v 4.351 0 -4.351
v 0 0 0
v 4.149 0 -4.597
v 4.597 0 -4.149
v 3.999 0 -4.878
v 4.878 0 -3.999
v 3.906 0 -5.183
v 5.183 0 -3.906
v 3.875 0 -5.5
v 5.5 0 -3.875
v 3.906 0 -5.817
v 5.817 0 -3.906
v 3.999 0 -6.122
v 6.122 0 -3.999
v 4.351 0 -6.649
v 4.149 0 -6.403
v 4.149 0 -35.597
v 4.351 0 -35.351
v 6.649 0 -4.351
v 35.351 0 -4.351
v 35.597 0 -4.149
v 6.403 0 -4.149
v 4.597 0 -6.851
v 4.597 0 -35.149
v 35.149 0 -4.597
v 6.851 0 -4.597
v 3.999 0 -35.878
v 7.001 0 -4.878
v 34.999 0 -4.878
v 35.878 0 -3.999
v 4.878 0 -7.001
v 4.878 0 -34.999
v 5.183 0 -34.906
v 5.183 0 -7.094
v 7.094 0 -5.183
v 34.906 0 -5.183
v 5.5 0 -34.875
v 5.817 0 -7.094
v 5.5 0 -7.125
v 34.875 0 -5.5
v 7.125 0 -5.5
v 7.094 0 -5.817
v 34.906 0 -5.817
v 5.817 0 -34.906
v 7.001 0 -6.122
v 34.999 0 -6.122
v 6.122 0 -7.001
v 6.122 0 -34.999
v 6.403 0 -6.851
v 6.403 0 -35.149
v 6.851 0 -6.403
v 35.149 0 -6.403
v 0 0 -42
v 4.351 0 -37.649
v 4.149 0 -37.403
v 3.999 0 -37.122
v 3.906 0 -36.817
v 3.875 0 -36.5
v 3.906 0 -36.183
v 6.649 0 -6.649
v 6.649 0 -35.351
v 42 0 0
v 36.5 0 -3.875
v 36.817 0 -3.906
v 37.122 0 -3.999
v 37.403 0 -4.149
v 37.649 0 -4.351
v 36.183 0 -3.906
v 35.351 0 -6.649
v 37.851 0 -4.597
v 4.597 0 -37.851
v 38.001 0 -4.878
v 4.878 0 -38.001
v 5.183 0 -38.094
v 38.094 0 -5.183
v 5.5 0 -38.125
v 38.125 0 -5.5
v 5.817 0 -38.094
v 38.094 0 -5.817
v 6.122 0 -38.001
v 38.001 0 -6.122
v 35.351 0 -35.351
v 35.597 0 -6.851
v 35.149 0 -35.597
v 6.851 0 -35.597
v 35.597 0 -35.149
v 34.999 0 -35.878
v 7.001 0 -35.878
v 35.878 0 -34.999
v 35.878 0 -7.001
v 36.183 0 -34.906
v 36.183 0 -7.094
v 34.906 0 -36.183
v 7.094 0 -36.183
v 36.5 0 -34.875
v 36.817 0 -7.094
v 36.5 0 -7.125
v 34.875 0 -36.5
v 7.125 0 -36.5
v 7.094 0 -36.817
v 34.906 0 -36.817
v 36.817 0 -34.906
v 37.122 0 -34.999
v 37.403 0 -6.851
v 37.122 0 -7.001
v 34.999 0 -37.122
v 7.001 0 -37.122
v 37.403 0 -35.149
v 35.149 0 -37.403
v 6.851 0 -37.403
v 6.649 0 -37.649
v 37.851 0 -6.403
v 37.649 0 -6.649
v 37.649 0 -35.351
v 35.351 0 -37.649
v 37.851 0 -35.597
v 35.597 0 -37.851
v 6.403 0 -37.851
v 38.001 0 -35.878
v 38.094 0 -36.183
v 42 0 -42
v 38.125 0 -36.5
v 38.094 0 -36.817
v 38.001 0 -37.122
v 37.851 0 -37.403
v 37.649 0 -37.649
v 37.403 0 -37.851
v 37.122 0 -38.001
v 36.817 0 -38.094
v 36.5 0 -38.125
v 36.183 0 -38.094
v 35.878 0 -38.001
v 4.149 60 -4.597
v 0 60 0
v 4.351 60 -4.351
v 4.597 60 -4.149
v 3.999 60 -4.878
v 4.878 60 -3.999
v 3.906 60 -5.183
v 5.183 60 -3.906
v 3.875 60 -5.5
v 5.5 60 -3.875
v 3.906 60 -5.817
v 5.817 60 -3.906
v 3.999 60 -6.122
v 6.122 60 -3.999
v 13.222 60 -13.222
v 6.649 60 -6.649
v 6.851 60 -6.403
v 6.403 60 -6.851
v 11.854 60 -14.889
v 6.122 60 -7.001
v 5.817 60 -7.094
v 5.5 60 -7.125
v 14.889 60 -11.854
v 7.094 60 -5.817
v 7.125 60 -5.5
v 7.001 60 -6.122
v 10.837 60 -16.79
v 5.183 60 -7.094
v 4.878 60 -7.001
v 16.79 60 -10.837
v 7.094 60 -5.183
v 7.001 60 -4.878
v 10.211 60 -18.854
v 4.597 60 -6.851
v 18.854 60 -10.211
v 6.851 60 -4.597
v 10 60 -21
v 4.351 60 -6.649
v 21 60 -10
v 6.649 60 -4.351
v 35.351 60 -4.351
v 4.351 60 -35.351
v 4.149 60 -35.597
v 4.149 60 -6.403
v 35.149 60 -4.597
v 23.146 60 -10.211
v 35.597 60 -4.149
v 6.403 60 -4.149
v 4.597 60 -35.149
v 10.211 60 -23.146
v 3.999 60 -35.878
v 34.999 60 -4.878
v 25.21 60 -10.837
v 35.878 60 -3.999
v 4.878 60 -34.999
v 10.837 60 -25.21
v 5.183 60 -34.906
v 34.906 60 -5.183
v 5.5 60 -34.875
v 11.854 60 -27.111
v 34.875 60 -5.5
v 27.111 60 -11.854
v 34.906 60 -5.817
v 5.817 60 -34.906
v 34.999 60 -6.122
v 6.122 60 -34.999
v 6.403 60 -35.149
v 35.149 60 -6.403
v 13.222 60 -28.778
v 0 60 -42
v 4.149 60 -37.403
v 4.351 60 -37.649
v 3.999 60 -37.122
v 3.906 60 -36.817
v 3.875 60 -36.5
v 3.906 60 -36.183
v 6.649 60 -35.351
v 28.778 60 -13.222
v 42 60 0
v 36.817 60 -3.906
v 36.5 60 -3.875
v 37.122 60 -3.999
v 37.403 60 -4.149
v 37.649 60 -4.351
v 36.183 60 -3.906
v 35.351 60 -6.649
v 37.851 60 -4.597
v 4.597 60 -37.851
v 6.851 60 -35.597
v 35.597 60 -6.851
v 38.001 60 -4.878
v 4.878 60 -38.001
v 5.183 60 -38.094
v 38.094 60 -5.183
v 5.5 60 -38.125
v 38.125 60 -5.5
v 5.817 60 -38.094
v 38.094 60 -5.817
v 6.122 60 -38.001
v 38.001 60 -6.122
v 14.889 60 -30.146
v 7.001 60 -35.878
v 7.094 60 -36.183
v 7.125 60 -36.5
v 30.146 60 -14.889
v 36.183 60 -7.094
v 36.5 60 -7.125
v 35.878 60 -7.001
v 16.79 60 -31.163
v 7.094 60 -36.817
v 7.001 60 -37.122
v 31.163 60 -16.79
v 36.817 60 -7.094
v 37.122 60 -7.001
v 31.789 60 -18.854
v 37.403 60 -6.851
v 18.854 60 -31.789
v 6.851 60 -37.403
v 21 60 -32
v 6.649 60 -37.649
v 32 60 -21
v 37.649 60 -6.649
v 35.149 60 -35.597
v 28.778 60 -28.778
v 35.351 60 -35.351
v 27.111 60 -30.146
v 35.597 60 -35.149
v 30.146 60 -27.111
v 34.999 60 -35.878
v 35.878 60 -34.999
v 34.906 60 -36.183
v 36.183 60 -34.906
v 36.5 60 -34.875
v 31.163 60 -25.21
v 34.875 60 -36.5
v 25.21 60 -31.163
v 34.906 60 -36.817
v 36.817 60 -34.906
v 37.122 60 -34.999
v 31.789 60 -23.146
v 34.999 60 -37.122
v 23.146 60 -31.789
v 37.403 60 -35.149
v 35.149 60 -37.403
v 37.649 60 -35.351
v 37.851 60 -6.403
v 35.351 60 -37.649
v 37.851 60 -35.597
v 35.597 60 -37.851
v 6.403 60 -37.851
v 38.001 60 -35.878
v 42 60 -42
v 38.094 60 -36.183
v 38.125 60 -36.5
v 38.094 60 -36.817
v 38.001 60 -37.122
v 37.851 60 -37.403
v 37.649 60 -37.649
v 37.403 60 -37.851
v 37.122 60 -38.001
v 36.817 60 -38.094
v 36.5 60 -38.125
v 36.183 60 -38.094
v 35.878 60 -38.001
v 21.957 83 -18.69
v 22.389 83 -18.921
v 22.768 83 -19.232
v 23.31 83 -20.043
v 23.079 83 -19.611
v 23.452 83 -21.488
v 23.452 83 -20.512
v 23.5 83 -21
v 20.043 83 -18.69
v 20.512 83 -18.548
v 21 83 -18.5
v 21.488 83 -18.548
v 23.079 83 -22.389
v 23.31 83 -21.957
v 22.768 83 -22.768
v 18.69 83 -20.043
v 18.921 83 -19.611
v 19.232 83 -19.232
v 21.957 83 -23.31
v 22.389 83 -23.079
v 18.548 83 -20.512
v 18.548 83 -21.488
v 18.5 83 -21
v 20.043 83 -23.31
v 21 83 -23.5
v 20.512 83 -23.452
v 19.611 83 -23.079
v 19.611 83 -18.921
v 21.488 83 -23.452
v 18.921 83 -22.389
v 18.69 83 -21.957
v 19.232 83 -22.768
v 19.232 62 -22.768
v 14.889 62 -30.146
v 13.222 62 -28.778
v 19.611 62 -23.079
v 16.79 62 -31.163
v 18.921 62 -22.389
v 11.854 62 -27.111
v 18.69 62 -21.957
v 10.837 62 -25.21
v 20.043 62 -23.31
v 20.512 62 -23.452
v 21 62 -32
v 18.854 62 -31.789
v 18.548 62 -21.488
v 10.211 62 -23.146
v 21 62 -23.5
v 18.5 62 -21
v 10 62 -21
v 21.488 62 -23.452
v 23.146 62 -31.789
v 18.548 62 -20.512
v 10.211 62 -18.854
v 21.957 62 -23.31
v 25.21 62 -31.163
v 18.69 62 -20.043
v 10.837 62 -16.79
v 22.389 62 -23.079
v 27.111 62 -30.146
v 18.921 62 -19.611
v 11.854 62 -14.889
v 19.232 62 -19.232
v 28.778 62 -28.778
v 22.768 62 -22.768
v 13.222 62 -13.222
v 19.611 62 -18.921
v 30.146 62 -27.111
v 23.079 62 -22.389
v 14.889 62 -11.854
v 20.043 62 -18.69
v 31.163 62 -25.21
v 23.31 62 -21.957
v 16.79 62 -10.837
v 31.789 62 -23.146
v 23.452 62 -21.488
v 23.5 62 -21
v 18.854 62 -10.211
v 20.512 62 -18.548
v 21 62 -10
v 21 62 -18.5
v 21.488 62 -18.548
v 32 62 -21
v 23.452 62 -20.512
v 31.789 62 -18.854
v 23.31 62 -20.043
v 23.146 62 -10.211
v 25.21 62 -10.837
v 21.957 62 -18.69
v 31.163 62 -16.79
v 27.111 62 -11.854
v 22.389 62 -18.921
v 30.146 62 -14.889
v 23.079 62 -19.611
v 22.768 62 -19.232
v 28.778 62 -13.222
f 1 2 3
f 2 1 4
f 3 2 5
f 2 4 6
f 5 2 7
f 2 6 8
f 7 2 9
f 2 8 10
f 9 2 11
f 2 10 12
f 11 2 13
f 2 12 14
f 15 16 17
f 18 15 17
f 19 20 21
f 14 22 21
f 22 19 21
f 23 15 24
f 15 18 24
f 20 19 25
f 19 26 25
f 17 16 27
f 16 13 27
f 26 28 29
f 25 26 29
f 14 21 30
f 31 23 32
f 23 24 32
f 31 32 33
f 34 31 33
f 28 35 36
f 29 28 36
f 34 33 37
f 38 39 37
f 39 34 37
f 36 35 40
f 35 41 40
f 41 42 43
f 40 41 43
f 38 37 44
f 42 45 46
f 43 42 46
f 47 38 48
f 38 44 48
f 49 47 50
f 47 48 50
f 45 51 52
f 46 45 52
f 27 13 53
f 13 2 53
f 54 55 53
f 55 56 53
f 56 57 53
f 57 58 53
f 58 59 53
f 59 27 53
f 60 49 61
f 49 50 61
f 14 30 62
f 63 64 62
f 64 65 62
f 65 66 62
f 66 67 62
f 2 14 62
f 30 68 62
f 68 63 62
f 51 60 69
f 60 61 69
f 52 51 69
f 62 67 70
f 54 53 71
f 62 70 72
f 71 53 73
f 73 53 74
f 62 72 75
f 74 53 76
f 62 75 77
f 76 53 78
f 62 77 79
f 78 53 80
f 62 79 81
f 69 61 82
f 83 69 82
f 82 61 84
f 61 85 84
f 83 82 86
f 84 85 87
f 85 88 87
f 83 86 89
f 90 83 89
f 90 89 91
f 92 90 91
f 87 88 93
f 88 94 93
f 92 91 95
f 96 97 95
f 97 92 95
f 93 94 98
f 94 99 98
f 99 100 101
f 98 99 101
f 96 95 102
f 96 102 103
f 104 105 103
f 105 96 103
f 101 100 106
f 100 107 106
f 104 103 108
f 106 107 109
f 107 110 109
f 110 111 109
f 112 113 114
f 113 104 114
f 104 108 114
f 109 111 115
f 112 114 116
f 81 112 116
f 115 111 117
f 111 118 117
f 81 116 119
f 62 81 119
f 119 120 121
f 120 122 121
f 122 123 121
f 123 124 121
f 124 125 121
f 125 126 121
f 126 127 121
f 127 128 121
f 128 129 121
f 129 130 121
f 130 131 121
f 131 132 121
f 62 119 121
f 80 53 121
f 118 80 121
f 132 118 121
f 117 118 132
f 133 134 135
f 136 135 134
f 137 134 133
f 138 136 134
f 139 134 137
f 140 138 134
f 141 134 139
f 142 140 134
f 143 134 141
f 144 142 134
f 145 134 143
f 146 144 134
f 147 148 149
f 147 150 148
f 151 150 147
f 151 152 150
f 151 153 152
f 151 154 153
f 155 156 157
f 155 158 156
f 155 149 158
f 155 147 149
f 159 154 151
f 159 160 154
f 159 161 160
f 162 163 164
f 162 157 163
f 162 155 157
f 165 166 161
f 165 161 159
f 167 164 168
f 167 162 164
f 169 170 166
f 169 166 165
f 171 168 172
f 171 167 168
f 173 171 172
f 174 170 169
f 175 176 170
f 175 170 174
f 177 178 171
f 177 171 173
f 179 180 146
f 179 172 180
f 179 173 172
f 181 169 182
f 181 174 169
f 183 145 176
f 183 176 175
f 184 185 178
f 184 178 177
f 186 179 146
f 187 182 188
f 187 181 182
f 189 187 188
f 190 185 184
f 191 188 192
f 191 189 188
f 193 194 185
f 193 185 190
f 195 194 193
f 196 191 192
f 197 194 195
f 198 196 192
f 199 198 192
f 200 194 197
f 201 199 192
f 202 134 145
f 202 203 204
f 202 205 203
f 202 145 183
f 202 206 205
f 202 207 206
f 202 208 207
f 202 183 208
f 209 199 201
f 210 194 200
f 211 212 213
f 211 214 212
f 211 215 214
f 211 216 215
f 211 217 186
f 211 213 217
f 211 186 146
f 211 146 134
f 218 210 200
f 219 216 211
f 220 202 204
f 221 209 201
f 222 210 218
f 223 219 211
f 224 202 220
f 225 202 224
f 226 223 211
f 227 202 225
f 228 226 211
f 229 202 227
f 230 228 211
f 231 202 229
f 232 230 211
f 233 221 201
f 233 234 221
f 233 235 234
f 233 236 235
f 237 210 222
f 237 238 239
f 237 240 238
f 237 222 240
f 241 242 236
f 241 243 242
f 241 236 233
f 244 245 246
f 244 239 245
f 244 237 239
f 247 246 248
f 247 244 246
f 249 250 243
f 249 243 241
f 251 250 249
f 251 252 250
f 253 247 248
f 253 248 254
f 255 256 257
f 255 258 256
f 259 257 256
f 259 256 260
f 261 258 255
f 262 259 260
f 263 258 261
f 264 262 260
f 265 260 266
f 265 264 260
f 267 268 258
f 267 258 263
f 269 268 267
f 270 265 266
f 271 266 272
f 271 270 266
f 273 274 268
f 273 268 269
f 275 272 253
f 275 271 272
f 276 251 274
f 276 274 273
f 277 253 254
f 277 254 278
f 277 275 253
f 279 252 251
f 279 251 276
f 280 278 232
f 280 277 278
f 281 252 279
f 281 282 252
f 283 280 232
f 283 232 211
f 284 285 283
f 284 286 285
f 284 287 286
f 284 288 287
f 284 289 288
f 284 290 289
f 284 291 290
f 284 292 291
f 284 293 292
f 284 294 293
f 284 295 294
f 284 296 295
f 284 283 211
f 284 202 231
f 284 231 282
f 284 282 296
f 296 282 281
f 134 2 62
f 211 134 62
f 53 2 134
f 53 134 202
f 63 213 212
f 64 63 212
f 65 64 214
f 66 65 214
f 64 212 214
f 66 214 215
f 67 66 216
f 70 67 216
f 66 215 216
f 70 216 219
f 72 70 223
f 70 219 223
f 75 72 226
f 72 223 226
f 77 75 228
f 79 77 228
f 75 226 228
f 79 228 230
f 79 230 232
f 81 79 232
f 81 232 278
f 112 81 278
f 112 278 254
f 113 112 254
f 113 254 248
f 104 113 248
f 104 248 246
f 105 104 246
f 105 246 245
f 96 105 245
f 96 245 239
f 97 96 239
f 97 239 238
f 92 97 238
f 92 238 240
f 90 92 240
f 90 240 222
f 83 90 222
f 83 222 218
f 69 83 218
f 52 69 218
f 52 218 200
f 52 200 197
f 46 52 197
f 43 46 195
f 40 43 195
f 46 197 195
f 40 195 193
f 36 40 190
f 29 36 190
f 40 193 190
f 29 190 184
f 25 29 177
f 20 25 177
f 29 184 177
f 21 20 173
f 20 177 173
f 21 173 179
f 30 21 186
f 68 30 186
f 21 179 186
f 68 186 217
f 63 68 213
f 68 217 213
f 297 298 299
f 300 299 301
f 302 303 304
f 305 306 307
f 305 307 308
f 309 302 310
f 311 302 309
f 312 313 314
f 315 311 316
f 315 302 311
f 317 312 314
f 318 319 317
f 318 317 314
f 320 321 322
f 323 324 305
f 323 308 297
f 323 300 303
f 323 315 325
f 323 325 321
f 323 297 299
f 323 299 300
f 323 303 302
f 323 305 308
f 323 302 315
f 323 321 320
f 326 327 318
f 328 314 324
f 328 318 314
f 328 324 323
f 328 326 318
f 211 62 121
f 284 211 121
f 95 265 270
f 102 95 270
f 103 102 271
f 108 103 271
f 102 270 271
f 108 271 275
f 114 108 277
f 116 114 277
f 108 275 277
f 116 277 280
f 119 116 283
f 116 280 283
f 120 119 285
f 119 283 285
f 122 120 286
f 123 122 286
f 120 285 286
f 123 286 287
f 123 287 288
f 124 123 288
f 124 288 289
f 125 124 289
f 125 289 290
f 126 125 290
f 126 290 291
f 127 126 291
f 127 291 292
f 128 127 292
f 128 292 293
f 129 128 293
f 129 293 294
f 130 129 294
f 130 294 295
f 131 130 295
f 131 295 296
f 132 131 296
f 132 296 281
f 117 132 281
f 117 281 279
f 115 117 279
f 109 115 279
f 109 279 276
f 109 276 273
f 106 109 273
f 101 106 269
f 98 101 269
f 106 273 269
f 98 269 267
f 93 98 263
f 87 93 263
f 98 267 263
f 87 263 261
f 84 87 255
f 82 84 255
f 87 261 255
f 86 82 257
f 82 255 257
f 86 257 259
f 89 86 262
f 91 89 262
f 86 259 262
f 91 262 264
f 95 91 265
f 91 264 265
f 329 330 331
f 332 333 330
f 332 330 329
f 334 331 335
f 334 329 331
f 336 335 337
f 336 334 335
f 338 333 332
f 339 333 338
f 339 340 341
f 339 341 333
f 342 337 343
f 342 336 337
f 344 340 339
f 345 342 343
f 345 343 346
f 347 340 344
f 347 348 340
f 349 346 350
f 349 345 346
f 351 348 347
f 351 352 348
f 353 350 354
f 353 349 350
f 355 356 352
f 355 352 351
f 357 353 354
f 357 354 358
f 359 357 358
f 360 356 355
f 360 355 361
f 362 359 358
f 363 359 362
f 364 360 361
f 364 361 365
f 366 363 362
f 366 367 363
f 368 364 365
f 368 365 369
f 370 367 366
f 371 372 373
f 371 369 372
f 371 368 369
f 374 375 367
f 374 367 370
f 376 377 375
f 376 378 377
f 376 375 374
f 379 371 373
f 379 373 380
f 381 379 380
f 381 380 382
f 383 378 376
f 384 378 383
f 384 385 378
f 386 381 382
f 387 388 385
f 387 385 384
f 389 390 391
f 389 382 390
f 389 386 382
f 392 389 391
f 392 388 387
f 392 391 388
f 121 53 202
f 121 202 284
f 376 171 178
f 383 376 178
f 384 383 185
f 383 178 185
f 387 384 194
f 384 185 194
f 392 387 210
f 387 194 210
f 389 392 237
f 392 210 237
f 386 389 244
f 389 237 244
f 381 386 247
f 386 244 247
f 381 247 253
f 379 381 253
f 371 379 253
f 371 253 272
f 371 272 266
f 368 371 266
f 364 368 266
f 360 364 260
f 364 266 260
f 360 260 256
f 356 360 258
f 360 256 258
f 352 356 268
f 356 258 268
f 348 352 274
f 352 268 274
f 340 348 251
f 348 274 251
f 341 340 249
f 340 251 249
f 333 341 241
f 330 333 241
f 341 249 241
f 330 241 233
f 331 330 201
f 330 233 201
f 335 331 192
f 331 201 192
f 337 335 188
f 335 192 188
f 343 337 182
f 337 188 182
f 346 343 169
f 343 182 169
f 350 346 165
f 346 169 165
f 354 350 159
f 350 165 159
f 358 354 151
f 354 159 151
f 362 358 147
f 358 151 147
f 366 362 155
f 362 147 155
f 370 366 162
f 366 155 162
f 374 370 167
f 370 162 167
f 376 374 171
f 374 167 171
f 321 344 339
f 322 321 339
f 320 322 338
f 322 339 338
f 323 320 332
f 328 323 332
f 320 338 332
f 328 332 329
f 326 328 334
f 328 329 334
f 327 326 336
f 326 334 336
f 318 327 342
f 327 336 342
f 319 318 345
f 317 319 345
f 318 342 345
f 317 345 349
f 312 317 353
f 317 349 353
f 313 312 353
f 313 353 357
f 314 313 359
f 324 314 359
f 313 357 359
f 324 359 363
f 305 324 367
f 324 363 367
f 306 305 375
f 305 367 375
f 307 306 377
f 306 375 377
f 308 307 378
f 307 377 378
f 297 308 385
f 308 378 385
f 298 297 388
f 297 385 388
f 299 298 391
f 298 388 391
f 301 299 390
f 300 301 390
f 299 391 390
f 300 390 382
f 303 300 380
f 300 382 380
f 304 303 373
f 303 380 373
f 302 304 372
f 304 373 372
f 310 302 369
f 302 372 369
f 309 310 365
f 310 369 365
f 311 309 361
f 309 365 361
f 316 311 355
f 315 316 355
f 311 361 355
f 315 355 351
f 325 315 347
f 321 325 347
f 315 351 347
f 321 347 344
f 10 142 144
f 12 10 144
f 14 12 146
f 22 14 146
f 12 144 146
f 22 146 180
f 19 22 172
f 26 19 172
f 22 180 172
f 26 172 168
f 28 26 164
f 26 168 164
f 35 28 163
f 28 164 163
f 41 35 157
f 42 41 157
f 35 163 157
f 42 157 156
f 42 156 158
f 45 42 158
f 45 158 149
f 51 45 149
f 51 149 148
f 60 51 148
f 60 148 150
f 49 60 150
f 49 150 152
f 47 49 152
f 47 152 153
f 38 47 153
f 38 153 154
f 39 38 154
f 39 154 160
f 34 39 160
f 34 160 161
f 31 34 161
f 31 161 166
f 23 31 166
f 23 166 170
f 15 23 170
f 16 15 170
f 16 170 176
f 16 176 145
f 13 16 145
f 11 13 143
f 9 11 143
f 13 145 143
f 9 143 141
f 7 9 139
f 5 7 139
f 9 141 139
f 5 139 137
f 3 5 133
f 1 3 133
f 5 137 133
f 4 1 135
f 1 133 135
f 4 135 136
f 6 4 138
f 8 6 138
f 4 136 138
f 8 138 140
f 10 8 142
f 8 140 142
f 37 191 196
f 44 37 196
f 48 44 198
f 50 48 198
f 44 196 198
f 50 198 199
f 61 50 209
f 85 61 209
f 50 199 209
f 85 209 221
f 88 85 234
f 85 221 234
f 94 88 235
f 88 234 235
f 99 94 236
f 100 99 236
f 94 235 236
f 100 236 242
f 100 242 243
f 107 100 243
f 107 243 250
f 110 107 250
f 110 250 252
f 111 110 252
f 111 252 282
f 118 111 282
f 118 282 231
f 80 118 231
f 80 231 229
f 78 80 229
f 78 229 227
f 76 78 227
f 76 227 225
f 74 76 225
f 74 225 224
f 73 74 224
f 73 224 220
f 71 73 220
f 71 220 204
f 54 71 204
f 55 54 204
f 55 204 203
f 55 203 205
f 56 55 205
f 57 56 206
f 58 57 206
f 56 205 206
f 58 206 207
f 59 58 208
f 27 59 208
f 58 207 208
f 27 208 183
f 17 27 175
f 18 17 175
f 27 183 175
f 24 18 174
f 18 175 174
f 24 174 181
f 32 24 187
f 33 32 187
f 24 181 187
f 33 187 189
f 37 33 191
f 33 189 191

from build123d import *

# Parameters (mm, degrees)
SKETCH_1_W          = 42
SKETCH_1_H          = 42
EXTRUDE_1_DEPTH     = 60
SKETCH_2_R          = 11
EXTRUDE_2_DEPTH     = 2
SKETCH_3_R          = 2.5
EXTRUDE_3_DEPTH     = 21
SKETCH_4_R          = 1.625
CUT_EXTRUDE_1_DEPTH = 85.427483677


with BuildPart() as part:
    # 草图1 → 凸台-拉伸1 (new body)
    with BuildSketch(Plane(origin=(0, 0, 0), x_dir=(1, 0, 0), z_dir=(0, 1, 0))):
        with Locations((21, 21)):
            Rectangle(SKETCH_1_W, SKETCH_1_H)
    extrude(amount=EXTRUDE_1_DEPTH)

    # 草图2 → 凸台-拉伸2 (add)
    with BuildSketch(Plane(origin=(0, 60, 0), x_dir=(1, 0, 0), z_dir=(0, 1, 0))):
        with Locations(Location((21, 21, 0), (0, 0, 270))):
            Circle(SKETCH_2_R)
    extrude(amount=EXTRUDE_2_DEPTH)

    # 草图3 → 凸台-拉伸3 (add)
    with BuildSketch(Plane(origin=(0, 62, 0), x_dir=(1, 0, 0), z_dir=(0, 1, 0))):
        with Locations(Location((21, 21, 0), (0, 0, 90))):
            Circle(SKETCH_3_R)
    extrude(amount=EXTRUDE_3_DEPTH)

    # 草图4 → 切除-拉伸1 (cut, through all)
    with BuildSketch(Plane(origin=(0, 60, 0), x_dir=(1, 0, 0), z_dir=(0, 1, 0))):
        with Locations(Location((5.5, 36.5, 0), (0, 0, 270))):
            Circle(SKETCH_4_R)
        with Locations(Location((36.5, 36.5, 0), (0, 0, 270))):
            Circle(SKETCH_4_R)
        with Locations(Location((36.5, 5.5, 0), (0, 0, 270))):
            Circle(SKETCH_4_R)
        with Locations(Location((5.5, 5.5, 0), (0, 0, 270))):
            Circle(SKETCH_4_R)
    extrude(amount=-CUT_EXTRUDE_1_DEPTH, mode=Mode.SUBTRACT)


solid = part.part
